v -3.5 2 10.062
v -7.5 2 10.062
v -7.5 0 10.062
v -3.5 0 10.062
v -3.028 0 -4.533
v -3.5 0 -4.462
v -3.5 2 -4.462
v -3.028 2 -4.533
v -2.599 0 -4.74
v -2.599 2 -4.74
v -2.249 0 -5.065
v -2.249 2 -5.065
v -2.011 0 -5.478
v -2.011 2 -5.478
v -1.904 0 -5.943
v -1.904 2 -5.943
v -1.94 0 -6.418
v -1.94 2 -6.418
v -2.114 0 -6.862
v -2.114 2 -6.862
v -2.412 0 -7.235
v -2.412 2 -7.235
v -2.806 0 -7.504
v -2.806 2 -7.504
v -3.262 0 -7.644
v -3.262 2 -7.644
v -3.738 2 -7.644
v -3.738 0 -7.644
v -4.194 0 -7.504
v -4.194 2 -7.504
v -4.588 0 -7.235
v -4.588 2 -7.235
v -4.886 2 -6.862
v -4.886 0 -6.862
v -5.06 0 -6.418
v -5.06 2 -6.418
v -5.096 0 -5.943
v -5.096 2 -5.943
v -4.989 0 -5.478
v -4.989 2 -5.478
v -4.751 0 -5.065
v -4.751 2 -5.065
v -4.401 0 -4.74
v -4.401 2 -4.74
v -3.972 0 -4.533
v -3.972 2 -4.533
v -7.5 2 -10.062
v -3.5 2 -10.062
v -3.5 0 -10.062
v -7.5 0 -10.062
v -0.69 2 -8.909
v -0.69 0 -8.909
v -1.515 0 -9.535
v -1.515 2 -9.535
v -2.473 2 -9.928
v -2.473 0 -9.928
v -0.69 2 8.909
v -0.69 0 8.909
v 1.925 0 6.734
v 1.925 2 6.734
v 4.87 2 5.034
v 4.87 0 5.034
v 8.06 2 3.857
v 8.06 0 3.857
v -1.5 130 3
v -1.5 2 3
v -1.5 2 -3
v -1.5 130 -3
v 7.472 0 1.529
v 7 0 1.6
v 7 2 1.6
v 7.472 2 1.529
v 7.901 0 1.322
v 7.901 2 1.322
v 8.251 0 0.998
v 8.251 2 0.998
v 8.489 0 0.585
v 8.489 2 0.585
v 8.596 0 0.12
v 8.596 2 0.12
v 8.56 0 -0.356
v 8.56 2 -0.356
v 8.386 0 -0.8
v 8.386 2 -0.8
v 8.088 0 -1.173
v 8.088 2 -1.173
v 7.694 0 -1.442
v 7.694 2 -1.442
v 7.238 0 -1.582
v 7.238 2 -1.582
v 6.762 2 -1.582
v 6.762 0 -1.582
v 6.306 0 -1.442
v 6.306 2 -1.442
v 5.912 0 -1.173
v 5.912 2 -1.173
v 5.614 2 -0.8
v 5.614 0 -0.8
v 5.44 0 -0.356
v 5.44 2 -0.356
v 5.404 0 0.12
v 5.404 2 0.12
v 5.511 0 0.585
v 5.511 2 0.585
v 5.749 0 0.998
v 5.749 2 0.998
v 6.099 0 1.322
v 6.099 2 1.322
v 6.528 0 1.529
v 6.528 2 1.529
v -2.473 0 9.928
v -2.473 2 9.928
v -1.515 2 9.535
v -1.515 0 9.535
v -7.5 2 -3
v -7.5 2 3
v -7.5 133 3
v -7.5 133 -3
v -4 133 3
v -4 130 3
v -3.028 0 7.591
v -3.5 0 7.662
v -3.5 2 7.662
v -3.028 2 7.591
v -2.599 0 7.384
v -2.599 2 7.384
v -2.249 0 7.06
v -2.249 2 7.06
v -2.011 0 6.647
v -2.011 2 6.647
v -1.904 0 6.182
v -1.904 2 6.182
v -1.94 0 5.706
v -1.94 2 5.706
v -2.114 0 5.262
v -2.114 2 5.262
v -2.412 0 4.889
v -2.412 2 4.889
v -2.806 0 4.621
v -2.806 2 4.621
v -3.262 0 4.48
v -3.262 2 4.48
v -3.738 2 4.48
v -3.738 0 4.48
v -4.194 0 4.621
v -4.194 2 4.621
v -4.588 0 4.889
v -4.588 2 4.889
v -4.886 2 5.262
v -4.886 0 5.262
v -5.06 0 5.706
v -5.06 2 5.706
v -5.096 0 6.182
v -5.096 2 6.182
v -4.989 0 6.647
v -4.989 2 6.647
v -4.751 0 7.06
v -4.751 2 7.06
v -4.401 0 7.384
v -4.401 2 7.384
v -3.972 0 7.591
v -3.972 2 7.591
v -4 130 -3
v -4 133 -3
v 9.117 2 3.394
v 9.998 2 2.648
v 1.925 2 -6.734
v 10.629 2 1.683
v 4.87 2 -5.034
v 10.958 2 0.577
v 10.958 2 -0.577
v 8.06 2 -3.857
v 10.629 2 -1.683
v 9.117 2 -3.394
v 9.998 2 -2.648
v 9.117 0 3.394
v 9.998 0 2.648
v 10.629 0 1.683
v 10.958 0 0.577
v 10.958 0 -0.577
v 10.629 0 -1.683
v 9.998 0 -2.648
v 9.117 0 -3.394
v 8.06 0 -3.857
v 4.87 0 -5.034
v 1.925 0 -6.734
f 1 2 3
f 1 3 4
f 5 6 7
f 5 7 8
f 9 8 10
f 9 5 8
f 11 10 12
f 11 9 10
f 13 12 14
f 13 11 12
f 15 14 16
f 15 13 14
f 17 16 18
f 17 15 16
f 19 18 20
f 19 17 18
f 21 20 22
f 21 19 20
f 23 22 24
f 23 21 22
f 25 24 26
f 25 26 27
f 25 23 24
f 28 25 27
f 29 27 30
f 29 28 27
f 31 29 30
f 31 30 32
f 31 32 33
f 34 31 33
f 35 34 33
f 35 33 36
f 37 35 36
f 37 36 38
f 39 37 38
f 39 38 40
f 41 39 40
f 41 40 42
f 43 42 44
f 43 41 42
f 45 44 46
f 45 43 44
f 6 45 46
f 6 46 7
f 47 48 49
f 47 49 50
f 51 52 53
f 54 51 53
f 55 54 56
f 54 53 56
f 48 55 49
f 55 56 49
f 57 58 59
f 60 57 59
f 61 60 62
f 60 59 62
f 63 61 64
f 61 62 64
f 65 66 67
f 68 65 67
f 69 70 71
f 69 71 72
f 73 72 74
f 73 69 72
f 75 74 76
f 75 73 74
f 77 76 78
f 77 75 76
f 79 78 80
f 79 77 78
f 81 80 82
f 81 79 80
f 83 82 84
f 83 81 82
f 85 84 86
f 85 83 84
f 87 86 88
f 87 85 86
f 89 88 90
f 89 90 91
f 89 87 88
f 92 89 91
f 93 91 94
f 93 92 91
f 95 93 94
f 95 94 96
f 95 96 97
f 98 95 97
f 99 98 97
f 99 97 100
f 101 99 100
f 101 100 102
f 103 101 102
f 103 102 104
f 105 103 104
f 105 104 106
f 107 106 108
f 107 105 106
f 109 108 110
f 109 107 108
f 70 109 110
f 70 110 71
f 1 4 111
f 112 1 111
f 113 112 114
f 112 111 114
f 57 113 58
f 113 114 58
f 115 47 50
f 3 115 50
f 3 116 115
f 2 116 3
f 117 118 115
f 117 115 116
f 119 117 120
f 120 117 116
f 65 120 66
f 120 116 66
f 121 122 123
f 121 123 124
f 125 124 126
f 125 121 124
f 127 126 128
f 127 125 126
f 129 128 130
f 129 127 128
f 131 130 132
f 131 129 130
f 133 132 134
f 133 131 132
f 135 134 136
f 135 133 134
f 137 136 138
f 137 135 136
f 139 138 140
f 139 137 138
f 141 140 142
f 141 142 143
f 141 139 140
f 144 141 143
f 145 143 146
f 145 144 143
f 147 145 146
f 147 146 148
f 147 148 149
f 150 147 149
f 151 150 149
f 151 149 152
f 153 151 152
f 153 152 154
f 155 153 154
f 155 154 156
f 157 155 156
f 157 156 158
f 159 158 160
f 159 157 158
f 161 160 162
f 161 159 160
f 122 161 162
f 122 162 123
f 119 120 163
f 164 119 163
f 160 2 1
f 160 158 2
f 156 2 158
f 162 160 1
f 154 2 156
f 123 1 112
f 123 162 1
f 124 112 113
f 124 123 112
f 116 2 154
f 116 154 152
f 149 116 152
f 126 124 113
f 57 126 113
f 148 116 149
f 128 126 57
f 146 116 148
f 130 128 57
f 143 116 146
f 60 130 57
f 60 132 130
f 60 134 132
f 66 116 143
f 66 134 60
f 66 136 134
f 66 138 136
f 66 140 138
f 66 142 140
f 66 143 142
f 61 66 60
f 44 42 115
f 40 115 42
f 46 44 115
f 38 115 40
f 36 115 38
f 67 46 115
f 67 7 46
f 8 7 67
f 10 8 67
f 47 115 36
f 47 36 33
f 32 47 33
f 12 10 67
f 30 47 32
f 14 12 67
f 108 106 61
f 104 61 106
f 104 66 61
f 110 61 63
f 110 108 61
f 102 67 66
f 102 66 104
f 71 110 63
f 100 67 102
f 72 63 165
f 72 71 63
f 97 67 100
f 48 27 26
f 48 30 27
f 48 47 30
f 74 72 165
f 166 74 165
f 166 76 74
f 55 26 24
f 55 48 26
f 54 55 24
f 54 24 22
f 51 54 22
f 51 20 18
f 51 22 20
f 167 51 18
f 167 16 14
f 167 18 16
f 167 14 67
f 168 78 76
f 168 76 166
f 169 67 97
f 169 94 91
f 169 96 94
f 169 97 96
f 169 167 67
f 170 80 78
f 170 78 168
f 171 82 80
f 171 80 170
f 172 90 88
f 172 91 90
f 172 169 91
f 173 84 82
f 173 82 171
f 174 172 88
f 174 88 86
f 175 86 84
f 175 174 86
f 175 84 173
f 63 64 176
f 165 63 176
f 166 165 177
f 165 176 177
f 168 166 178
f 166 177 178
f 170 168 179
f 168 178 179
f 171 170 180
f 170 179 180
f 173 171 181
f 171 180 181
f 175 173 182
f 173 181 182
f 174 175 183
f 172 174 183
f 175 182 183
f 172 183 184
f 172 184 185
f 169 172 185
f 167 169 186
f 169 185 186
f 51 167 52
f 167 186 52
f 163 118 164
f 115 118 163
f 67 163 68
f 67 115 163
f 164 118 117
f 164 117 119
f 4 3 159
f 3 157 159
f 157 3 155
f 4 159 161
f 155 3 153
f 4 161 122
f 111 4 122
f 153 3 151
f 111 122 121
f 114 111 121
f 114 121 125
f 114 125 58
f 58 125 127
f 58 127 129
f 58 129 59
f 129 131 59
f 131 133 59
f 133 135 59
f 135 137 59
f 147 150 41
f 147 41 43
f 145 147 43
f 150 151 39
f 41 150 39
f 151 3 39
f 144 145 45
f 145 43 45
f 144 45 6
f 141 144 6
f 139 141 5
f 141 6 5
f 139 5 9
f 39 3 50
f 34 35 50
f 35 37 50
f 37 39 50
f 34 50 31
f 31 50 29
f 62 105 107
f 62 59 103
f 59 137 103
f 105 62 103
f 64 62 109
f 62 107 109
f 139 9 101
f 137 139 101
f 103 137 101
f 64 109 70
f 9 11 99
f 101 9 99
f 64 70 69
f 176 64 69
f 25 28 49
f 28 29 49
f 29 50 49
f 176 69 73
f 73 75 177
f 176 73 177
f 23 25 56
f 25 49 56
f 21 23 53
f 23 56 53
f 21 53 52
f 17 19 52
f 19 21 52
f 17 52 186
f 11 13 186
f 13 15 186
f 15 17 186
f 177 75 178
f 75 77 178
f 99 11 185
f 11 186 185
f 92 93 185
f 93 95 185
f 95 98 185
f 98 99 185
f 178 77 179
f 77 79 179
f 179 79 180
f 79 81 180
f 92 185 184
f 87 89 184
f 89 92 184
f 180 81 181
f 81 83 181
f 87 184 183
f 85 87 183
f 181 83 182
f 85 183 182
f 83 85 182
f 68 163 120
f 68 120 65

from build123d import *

# Parameters (mm, degrees)
SKETCH_1_R      = 1.6
EXTRUDE_1_DEPTH = 2
SKETCH_3_W      = 6
SKETCH_3_H      = 6
EXTRUDE_3_DEPTH = 130
SKETCH_4_W      = 3.5
SKETCH_4_H      = 6
EXTRUDE_4_DEPTH = 3
EXTRUDE_6_DEPTH = 2


with BuildPart() as part:
    # 草图1 → 凸台-拉伸1 (new body)
    with BuildSketch(Plane(origin=(0, 0, 0), x_dir=(1, 0, 0), z_dir=(0, 1, 0))):
        with BuildLine():
            ThreePointArc((8.06014642, -3.856953405), (11, 0), (8.06014642, 3.856953405))
            ThreePointArc((8.06014642, 3.856953405), (3.36087852, 5.821212354), (-0.68985358, 8.90876826))
            ThreePointArc((-0.68985358, 8.90876826), (-5.5, 9.526279442), (-7.37029284, 5.051814855))
            ThreePointArc((-7.37029284, 5.051814855), (-6.721757039, 0), (-7.37029284, -5.051814855))
            ThreePointArc((-7.37029284, -5.051814855), (-5.5, -9.526279442), (-0.68985358, -8.90876826))
            ThreePointArc((-0.68985358, -8.90876826), (3.36087852, -5.821212354), (8.06014642, -3.856953405))
        make_face()
        with Locations(Location((7, 0, 0), (0, 0, 270))):
            Circle(SKETCH_1_R, mode=Mode.SUBTRACT)
        with Locations(Location((-3.5, -6.062177826, 0), (0, 0, 270))):
            Circle(SKETCH_1_R, mode=Mode.SUBTRACT)
        with Locations(Location((-3.5, 6.062177826, 0), (0, 0, 270))):
            Circle(SKETCH_1_R, mode=Mode.SUBTRACT)
    extrude(amount=EXTRUDE_1_DEPTH)

    # 草图3 → 凸台-拉伸3 (add)
    with BuildSketch(Plane(origin=(0, 0, 0), x_dir=(1, 0, 0), z_dir=(0, 1, 0))):
        with Locations((-4.5, 0)):
            Rectangle(SKETCH_3_W, SKETCH_3_H)
    extrude(amount=EXTRUDE_3_DEPTH)

    # 草图4 → 凸台-拉伸4 (add)
    with BuildSketch(Plane(origin=(0, 130, 0), x_dir=(1, 0, 0), z_dir=(0, 1, 0))):
        with Locations((-5.75, 0)):
            Rectangle(SKETCH_4_W, SKETCH_4_H)
    extrude(amount=EXTRUDE_4_DEPTH)

    # 草图5 → 凸台-拉伸6 (add)
    with BuildSketch(Plane(origin=(0, 2, 0), x_dir=(1, 0, 0), z_dir=(0, 1, 0))):
        Polygon((-7.5, 6.062177826), (-7.5, -6.062177826), (-7.5, -10.062177826), (-3.5, -10.062177826), (-6.276889943, -8.064926479), (-6.276889943, 5.727222141), (-3.5, 10.062177826), (-7.5, 10.062177826), align=None)
    extrude(amount=-EXTRUDE_6_DEPTH)


solid = part.part
